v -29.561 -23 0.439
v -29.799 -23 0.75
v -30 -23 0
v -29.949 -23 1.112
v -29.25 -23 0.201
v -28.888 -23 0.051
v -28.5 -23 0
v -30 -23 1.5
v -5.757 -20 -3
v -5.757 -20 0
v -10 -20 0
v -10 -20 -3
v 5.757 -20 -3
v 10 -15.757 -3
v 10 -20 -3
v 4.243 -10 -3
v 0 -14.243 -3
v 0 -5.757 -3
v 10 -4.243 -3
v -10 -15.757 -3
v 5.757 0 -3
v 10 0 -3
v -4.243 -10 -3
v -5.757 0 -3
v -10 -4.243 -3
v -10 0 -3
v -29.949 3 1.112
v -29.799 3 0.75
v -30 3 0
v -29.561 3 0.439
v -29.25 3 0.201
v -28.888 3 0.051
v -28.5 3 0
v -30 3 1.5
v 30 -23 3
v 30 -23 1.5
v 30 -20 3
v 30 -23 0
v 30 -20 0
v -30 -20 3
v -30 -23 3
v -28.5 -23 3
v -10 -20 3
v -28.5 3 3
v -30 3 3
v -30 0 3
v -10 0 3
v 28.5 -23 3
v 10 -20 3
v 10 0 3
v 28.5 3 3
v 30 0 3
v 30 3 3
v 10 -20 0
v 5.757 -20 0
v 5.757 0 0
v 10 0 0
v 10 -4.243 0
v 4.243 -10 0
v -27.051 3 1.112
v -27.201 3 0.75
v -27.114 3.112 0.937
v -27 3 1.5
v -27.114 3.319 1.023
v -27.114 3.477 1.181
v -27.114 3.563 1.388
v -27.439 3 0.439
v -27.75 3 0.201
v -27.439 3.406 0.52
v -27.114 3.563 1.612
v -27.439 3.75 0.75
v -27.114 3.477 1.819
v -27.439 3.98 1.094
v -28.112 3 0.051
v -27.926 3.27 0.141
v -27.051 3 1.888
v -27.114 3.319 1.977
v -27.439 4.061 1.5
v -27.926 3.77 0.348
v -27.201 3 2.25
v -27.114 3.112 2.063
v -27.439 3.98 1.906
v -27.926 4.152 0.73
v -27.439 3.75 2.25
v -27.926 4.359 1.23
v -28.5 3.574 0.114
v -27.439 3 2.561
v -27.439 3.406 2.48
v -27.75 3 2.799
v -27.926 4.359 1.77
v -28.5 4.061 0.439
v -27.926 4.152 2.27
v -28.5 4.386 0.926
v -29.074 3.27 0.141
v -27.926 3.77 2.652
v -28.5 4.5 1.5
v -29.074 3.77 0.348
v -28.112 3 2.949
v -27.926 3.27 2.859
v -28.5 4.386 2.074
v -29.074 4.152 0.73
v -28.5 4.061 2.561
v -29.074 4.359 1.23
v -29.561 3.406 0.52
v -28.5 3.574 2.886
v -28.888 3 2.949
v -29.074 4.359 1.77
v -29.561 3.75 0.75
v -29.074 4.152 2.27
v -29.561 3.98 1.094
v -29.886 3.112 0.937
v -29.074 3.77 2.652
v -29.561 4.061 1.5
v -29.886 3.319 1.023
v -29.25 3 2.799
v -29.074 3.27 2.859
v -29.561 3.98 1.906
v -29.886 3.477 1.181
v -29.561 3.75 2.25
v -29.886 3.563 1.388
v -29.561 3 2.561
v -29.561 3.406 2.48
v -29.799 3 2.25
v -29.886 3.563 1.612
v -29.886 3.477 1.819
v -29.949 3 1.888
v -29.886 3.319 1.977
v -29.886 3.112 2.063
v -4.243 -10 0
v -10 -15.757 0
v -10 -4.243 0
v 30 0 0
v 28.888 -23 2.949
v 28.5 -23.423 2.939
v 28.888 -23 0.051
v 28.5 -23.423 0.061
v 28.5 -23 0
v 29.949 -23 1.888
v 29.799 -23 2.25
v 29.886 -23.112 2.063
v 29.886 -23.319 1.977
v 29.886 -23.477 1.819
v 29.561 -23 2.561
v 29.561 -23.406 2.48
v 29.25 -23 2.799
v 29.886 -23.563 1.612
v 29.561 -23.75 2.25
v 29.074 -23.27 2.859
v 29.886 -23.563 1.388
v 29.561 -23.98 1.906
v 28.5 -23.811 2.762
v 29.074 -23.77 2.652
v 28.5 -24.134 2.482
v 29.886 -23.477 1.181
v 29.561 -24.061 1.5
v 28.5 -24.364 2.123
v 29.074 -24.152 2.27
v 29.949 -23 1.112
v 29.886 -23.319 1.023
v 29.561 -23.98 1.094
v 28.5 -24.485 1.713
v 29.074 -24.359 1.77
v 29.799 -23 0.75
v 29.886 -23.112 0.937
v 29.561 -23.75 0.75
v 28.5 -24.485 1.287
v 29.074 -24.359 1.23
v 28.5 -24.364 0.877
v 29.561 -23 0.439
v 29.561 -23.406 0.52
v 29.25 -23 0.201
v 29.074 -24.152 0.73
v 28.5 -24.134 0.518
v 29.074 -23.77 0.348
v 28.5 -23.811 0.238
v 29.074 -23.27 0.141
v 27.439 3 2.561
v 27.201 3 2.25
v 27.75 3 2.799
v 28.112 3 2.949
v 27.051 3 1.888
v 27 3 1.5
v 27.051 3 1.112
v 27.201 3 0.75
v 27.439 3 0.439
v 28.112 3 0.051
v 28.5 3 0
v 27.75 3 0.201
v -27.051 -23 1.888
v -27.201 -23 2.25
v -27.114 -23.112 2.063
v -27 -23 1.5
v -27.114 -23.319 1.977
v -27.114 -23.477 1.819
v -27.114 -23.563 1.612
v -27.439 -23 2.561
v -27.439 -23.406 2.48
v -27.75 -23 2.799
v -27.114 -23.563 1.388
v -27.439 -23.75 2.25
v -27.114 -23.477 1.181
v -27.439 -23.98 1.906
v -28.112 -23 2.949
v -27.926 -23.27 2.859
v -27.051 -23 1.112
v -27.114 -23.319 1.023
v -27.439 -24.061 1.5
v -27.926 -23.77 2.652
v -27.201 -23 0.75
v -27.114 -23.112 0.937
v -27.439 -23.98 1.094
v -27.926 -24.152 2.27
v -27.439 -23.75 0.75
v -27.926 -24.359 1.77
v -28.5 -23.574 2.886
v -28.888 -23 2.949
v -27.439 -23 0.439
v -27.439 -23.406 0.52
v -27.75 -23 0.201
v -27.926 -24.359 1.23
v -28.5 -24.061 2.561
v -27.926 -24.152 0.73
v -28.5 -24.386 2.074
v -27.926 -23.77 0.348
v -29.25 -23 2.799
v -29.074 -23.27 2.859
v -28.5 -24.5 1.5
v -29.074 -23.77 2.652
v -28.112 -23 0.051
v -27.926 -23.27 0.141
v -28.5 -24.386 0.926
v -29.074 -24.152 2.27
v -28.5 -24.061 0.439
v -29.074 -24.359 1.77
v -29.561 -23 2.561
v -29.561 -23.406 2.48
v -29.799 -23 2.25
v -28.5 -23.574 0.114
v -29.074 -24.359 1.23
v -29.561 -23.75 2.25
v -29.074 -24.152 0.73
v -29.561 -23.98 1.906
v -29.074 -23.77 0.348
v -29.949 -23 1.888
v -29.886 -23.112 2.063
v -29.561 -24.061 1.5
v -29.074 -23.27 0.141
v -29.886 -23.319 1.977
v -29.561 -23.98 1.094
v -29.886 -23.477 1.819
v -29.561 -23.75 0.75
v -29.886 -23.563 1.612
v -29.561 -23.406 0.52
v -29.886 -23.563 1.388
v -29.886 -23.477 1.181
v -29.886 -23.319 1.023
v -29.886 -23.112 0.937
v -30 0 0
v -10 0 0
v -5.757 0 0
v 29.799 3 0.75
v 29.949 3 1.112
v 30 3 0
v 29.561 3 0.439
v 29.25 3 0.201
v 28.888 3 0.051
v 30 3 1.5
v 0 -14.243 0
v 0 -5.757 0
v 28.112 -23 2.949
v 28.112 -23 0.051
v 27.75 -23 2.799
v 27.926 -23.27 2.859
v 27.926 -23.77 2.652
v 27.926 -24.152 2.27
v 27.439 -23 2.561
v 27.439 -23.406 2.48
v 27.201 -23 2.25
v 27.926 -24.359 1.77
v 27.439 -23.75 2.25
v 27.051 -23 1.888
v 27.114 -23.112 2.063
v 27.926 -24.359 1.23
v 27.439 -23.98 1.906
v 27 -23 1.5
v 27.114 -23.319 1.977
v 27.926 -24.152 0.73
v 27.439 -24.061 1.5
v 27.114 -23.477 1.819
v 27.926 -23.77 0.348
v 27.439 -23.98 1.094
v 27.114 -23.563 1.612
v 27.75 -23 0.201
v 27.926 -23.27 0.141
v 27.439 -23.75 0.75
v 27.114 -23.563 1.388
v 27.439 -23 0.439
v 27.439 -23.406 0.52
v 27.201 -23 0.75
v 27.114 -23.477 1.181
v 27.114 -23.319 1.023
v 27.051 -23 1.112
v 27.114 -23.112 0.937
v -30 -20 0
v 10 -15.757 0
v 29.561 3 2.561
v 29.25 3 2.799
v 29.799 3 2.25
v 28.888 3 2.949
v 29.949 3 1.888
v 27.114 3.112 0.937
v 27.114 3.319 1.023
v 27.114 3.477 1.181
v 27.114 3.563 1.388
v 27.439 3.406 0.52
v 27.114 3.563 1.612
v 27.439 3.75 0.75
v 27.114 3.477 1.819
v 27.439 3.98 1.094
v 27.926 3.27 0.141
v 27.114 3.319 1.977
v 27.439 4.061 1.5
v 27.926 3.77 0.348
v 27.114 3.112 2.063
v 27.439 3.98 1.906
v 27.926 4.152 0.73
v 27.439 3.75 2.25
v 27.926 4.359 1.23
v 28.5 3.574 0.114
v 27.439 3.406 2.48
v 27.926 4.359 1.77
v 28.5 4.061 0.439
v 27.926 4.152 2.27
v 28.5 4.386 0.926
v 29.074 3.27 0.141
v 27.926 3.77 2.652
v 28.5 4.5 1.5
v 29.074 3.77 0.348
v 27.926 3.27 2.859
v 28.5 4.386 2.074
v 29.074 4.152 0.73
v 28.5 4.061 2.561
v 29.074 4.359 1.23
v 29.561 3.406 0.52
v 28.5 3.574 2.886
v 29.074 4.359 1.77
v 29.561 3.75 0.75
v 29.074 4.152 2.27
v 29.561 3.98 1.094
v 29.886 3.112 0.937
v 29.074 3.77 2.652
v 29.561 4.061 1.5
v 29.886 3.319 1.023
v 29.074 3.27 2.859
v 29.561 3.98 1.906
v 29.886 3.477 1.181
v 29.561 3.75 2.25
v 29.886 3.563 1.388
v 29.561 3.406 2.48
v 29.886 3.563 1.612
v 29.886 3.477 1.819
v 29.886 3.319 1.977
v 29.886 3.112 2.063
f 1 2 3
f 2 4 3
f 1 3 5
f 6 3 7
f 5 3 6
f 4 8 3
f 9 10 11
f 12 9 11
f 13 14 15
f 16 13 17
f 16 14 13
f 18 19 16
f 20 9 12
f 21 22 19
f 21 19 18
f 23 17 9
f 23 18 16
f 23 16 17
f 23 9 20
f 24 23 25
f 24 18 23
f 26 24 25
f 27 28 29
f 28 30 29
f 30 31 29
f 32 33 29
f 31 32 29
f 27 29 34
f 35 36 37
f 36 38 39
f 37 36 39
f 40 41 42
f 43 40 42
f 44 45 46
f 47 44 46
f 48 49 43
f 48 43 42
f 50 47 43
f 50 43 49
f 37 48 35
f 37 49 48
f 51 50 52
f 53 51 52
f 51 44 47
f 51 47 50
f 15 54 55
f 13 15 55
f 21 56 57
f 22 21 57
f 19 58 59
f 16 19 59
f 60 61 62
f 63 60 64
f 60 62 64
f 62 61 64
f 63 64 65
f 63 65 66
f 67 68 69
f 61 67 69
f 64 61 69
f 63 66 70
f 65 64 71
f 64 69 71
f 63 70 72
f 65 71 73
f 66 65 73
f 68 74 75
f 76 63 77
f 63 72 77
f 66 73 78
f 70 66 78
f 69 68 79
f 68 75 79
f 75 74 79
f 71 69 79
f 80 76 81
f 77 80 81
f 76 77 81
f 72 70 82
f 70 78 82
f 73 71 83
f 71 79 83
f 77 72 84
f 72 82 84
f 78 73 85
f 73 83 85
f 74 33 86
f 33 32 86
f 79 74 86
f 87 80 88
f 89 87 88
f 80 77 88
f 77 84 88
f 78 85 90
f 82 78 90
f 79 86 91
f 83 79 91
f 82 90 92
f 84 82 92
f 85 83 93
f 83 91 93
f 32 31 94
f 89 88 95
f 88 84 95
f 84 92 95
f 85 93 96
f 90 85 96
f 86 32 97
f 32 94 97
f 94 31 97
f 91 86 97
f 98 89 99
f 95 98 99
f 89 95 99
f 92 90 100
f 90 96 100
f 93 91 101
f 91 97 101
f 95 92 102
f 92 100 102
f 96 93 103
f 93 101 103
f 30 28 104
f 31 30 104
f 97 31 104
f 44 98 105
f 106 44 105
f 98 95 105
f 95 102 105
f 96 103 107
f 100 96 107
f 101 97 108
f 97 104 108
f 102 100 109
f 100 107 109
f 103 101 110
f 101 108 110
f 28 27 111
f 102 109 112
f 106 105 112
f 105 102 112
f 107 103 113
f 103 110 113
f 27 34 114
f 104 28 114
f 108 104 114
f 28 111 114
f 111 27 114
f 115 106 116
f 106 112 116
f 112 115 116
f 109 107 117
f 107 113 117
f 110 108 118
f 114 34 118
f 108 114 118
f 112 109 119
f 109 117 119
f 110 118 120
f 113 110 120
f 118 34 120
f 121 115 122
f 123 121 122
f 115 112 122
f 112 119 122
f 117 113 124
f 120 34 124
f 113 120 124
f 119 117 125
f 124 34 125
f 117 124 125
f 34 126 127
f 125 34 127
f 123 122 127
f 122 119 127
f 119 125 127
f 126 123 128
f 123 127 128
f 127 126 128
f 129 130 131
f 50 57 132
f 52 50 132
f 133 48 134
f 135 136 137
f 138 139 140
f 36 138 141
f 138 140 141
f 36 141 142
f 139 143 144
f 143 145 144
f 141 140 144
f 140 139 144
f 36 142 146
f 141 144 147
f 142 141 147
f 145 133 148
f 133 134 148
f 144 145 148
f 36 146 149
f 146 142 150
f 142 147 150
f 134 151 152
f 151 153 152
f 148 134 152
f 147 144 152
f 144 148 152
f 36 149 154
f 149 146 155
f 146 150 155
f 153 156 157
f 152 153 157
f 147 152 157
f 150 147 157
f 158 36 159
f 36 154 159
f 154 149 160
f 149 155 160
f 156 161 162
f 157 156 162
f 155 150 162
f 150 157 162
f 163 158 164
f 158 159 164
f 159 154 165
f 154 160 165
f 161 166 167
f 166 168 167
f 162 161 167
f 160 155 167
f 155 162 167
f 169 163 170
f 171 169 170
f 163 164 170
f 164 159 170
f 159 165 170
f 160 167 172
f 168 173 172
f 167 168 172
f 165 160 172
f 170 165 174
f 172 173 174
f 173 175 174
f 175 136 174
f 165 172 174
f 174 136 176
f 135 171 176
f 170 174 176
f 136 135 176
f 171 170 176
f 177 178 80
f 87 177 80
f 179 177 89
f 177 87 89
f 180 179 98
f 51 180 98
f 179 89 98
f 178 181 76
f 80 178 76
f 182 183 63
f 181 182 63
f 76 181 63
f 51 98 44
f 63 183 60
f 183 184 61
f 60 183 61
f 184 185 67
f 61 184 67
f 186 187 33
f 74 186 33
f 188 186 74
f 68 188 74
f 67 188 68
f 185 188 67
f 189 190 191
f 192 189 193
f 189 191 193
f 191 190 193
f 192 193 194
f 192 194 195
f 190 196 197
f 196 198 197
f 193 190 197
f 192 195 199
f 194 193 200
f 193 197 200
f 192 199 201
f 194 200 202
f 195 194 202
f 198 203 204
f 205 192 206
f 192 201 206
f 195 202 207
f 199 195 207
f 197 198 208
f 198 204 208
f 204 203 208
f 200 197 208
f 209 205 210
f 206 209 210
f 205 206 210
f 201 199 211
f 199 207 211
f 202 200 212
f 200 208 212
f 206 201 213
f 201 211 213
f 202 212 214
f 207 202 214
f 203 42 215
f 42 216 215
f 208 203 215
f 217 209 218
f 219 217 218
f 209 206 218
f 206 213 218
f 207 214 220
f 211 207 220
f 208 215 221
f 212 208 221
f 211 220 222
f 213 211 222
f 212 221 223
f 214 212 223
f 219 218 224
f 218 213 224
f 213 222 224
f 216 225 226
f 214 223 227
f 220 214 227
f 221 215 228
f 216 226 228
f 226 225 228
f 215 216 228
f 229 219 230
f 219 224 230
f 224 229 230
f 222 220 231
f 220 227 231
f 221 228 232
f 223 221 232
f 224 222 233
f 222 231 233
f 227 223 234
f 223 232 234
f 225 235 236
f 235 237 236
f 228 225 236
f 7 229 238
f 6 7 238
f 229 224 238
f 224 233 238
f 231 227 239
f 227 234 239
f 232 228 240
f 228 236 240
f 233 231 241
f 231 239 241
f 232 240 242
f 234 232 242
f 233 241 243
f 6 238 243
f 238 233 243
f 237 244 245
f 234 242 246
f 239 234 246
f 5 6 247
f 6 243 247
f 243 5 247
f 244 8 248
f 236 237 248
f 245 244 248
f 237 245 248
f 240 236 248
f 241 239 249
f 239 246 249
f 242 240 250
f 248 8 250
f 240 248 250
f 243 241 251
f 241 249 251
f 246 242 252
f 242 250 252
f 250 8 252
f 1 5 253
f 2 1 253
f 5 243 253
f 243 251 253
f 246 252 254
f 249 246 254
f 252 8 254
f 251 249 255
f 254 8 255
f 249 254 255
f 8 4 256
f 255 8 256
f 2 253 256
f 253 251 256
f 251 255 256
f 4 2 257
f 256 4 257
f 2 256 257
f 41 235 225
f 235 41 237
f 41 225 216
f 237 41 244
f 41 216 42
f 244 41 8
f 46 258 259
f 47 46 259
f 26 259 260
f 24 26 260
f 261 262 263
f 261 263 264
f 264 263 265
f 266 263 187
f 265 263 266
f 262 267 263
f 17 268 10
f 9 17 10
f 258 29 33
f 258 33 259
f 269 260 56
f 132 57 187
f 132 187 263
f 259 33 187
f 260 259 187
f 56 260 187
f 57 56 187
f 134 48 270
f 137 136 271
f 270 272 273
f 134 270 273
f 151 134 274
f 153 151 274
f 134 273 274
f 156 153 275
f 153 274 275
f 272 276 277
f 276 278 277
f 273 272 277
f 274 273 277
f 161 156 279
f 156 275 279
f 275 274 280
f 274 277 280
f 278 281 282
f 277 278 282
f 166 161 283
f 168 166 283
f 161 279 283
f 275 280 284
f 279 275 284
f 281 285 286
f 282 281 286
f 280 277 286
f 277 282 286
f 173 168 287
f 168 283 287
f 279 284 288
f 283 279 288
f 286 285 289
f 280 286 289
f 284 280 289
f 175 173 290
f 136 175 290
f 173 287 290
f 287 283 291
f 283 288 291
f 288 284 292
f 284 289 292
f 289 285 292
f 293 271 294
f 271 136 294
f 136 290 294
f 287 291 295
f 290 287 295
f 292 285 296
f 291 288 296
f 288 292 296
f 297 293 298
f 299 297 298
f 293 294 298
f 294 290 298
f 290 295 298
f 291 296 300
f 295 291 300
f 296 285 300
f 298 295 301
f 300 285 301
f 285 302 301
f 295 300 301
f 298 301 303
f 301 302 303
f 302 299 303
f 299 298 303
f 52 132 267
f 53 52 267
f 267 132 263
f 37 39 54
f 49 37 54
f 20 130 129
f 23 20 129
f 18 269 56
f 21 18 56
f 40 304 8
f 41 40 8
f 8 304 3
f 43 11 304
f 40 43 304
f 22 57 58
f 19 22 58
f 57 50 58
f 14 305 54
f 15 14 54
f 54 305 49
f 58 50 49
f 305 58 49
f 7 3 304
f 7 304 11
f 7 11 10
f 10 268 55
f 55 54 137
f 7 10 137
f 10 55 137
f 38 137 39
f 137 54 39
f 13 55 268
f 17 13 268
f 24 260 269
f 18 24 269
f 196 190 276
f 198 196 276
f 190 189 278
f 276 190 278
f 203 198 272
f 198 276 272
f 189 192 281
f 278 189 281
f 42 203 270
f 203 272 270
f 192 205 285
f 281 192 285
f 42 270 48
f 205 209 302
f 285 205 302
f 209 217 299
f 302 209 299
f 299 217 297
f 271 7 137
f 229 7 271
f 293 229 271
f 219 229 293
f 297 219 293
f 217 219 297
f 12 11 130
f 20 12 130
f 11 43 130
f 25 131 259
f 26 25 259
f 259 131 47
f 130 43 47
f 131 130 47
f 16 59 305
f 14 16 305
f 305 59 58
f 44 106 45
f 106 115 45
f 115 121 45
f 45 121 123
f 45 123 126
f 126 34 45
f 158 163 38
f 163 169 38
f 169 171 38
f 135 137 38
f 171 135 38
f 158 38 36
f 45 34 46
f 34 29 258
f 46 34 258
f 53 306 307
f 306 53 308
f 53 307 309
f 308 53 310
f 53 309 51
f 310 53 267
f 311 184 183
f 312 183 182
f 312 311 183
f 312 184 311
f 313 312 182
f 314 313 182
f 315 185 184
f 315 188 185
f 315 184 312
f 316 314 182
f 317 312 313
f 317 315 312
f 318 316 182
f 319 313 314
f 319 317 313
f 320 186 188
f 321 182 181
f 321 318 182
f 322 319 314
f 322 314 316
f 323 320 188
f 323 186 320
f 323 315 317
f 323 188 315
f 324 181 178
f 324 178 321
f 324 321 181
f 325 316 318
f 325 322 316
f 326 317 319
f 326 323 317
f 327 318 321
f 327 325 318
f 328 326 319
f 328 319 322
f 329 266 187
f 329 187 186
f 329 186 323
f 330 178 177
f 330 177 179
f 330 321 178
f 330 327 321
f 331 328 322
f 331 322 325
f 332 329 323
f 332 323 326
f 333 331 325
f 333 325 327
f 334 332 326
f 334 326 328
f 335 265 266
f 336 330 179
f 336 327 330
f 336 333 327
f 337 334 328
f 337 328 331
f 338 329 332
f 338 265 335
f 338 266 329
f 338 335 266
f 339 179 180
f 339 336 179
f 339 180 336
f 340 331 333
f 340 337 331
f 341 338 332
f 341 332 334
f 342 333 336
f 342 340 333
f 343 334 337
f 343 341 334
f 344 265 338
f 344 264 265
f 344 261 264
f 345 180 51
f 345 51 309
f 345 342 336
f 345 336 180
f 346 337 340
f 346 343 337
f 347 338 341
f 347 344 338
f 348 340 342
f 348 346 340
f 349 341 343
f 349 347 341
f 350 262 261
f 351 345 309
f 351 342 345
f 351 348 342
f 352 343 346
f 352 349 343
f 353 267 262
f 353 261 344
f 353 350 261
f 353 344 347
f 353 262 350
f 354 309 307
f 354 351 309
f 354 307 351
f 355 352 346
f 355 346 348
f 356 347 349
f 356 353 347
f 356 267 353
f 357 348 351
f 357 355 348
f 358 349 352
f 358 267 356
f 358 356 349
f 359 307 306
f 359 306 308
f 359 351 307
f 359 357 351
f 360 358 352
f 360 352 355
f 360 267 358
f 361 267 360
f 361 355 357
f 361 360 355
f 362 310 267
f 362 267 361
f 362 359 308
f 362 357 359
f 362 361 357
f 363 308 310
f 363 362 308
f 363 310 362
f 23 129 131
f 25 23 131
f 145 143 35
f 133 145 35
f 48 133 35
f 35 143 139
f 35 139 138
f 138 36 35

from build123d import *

# Parameters (mm, degrees)
BOSS_EXTRUDE1_DEPTH  = 3
BALL1_REVOLVED_ANGLE = 180
BOSS_EXTRUDE3_DEPTH  = 3


with BuildPart() as part:
    # Sketch1 → Boss-Extrude1 (new body)
    with BuildSketch(Plane.XY):
        Polygon((10, 0), (30, 0), (30, 3), (27, 3), (-27, 3), (-30, 3), (-30, 0), (-10, 0), (-10, -20), (-30, -20), (-30, -23), (-27, -23), (27, -23), (30, -23), (30, -20), (10, -20), align=None)
    extrude(amount=BOSS_EXTRUDE1_DEPTH)

    # ball1 → ball1_revolved (revolve)
    with BuildSketch(Plane(origin=(0, 3, 0), x_dir=(1, 0, 0), z_dir=(0, 1, 0))):
        with BuildLine():
            Line((30, -1.5), (27, -1.5))
            ThreePointArc((27, -1.5), (28.5, 0), (30, -1.5))
        make_face()
    revolve(axis=Axis((30, 3, 1.5), (1, 0, 0)), revolution_arc=BALL1_REVOLVED_ANGLE)

    # Sketch8 → Boss-Extrude3 (add)
    with BuildSketch(Plane(origin=(0, 0, 0), x_dir=(-1, 0, 0), z_dir=(0, 0, -1))):
        Polygon((-5.757359313, 0), (-10, 0), (-10, -4.242640687), (-4.242640687, -10), (0, -5.757359313), align=None)
        Polygon((5.757359313, 0), (0, -5.757359313), (4.242640687, -10), (10, -4.242640687), (10, 0), align=None)
        Polygon((4.242640687, -10), (0, -5.757359313), (-4.242640687, -10), (0, -14.242640687), align=None)
        Polygon((10, -15.757359313), (4.242640687, -10), (0, -14.242640687), (5.757359313, -20), (10, -20), align=None)
        Polygon((0, -14.242640687), (-4.242640687, -10), (-10, -15.757359313), (-10, -20), (-5.757359313, -20), align=None)
    extrude(amount=BOSS_EXTRUDE3_DEPTH)

    # Sketch5 → Revolve4 (revolve)
    with BuildSketch(Plane.XZ.offset(23)):
        with BuildLine():
            ThreePointArc((28.5, 3), (27.439339828, 2.560660172), (27, 1.5))
            Line((27, 1.5), (30, 1.5))
            ThreePointArc((30, 1.5), (29.560660172, 2.560660172), (28.5, 3))
        make_face()
        with BuildLine():
            ThreePointArc((-27, 1.5), (-28.5, 3), (-30, 1.5))
            Line((-30, 1.5), (-27, 1.5))
        make_face()
    revolve(axis=Axis((-30, -23, 1.5), (1, 0, 0)))

    # ball2 → Revolve5 (revolve)
    with BuildSketch(Plane(origin=(0, 3, 0), x_dir=(1, 0, 0), z_dir=(0, 1, 0))):
        with BuildLine():
            Line((-30, -1.5), (-27, -1.5))
            ThreePointArc((-27, -1.5), (-28.5, -3), (-30, -1.5))
        make_face()
    revolve(axis=Axis((-30, 3, 1.5), (1, 0, 0)))


solid = part.part
